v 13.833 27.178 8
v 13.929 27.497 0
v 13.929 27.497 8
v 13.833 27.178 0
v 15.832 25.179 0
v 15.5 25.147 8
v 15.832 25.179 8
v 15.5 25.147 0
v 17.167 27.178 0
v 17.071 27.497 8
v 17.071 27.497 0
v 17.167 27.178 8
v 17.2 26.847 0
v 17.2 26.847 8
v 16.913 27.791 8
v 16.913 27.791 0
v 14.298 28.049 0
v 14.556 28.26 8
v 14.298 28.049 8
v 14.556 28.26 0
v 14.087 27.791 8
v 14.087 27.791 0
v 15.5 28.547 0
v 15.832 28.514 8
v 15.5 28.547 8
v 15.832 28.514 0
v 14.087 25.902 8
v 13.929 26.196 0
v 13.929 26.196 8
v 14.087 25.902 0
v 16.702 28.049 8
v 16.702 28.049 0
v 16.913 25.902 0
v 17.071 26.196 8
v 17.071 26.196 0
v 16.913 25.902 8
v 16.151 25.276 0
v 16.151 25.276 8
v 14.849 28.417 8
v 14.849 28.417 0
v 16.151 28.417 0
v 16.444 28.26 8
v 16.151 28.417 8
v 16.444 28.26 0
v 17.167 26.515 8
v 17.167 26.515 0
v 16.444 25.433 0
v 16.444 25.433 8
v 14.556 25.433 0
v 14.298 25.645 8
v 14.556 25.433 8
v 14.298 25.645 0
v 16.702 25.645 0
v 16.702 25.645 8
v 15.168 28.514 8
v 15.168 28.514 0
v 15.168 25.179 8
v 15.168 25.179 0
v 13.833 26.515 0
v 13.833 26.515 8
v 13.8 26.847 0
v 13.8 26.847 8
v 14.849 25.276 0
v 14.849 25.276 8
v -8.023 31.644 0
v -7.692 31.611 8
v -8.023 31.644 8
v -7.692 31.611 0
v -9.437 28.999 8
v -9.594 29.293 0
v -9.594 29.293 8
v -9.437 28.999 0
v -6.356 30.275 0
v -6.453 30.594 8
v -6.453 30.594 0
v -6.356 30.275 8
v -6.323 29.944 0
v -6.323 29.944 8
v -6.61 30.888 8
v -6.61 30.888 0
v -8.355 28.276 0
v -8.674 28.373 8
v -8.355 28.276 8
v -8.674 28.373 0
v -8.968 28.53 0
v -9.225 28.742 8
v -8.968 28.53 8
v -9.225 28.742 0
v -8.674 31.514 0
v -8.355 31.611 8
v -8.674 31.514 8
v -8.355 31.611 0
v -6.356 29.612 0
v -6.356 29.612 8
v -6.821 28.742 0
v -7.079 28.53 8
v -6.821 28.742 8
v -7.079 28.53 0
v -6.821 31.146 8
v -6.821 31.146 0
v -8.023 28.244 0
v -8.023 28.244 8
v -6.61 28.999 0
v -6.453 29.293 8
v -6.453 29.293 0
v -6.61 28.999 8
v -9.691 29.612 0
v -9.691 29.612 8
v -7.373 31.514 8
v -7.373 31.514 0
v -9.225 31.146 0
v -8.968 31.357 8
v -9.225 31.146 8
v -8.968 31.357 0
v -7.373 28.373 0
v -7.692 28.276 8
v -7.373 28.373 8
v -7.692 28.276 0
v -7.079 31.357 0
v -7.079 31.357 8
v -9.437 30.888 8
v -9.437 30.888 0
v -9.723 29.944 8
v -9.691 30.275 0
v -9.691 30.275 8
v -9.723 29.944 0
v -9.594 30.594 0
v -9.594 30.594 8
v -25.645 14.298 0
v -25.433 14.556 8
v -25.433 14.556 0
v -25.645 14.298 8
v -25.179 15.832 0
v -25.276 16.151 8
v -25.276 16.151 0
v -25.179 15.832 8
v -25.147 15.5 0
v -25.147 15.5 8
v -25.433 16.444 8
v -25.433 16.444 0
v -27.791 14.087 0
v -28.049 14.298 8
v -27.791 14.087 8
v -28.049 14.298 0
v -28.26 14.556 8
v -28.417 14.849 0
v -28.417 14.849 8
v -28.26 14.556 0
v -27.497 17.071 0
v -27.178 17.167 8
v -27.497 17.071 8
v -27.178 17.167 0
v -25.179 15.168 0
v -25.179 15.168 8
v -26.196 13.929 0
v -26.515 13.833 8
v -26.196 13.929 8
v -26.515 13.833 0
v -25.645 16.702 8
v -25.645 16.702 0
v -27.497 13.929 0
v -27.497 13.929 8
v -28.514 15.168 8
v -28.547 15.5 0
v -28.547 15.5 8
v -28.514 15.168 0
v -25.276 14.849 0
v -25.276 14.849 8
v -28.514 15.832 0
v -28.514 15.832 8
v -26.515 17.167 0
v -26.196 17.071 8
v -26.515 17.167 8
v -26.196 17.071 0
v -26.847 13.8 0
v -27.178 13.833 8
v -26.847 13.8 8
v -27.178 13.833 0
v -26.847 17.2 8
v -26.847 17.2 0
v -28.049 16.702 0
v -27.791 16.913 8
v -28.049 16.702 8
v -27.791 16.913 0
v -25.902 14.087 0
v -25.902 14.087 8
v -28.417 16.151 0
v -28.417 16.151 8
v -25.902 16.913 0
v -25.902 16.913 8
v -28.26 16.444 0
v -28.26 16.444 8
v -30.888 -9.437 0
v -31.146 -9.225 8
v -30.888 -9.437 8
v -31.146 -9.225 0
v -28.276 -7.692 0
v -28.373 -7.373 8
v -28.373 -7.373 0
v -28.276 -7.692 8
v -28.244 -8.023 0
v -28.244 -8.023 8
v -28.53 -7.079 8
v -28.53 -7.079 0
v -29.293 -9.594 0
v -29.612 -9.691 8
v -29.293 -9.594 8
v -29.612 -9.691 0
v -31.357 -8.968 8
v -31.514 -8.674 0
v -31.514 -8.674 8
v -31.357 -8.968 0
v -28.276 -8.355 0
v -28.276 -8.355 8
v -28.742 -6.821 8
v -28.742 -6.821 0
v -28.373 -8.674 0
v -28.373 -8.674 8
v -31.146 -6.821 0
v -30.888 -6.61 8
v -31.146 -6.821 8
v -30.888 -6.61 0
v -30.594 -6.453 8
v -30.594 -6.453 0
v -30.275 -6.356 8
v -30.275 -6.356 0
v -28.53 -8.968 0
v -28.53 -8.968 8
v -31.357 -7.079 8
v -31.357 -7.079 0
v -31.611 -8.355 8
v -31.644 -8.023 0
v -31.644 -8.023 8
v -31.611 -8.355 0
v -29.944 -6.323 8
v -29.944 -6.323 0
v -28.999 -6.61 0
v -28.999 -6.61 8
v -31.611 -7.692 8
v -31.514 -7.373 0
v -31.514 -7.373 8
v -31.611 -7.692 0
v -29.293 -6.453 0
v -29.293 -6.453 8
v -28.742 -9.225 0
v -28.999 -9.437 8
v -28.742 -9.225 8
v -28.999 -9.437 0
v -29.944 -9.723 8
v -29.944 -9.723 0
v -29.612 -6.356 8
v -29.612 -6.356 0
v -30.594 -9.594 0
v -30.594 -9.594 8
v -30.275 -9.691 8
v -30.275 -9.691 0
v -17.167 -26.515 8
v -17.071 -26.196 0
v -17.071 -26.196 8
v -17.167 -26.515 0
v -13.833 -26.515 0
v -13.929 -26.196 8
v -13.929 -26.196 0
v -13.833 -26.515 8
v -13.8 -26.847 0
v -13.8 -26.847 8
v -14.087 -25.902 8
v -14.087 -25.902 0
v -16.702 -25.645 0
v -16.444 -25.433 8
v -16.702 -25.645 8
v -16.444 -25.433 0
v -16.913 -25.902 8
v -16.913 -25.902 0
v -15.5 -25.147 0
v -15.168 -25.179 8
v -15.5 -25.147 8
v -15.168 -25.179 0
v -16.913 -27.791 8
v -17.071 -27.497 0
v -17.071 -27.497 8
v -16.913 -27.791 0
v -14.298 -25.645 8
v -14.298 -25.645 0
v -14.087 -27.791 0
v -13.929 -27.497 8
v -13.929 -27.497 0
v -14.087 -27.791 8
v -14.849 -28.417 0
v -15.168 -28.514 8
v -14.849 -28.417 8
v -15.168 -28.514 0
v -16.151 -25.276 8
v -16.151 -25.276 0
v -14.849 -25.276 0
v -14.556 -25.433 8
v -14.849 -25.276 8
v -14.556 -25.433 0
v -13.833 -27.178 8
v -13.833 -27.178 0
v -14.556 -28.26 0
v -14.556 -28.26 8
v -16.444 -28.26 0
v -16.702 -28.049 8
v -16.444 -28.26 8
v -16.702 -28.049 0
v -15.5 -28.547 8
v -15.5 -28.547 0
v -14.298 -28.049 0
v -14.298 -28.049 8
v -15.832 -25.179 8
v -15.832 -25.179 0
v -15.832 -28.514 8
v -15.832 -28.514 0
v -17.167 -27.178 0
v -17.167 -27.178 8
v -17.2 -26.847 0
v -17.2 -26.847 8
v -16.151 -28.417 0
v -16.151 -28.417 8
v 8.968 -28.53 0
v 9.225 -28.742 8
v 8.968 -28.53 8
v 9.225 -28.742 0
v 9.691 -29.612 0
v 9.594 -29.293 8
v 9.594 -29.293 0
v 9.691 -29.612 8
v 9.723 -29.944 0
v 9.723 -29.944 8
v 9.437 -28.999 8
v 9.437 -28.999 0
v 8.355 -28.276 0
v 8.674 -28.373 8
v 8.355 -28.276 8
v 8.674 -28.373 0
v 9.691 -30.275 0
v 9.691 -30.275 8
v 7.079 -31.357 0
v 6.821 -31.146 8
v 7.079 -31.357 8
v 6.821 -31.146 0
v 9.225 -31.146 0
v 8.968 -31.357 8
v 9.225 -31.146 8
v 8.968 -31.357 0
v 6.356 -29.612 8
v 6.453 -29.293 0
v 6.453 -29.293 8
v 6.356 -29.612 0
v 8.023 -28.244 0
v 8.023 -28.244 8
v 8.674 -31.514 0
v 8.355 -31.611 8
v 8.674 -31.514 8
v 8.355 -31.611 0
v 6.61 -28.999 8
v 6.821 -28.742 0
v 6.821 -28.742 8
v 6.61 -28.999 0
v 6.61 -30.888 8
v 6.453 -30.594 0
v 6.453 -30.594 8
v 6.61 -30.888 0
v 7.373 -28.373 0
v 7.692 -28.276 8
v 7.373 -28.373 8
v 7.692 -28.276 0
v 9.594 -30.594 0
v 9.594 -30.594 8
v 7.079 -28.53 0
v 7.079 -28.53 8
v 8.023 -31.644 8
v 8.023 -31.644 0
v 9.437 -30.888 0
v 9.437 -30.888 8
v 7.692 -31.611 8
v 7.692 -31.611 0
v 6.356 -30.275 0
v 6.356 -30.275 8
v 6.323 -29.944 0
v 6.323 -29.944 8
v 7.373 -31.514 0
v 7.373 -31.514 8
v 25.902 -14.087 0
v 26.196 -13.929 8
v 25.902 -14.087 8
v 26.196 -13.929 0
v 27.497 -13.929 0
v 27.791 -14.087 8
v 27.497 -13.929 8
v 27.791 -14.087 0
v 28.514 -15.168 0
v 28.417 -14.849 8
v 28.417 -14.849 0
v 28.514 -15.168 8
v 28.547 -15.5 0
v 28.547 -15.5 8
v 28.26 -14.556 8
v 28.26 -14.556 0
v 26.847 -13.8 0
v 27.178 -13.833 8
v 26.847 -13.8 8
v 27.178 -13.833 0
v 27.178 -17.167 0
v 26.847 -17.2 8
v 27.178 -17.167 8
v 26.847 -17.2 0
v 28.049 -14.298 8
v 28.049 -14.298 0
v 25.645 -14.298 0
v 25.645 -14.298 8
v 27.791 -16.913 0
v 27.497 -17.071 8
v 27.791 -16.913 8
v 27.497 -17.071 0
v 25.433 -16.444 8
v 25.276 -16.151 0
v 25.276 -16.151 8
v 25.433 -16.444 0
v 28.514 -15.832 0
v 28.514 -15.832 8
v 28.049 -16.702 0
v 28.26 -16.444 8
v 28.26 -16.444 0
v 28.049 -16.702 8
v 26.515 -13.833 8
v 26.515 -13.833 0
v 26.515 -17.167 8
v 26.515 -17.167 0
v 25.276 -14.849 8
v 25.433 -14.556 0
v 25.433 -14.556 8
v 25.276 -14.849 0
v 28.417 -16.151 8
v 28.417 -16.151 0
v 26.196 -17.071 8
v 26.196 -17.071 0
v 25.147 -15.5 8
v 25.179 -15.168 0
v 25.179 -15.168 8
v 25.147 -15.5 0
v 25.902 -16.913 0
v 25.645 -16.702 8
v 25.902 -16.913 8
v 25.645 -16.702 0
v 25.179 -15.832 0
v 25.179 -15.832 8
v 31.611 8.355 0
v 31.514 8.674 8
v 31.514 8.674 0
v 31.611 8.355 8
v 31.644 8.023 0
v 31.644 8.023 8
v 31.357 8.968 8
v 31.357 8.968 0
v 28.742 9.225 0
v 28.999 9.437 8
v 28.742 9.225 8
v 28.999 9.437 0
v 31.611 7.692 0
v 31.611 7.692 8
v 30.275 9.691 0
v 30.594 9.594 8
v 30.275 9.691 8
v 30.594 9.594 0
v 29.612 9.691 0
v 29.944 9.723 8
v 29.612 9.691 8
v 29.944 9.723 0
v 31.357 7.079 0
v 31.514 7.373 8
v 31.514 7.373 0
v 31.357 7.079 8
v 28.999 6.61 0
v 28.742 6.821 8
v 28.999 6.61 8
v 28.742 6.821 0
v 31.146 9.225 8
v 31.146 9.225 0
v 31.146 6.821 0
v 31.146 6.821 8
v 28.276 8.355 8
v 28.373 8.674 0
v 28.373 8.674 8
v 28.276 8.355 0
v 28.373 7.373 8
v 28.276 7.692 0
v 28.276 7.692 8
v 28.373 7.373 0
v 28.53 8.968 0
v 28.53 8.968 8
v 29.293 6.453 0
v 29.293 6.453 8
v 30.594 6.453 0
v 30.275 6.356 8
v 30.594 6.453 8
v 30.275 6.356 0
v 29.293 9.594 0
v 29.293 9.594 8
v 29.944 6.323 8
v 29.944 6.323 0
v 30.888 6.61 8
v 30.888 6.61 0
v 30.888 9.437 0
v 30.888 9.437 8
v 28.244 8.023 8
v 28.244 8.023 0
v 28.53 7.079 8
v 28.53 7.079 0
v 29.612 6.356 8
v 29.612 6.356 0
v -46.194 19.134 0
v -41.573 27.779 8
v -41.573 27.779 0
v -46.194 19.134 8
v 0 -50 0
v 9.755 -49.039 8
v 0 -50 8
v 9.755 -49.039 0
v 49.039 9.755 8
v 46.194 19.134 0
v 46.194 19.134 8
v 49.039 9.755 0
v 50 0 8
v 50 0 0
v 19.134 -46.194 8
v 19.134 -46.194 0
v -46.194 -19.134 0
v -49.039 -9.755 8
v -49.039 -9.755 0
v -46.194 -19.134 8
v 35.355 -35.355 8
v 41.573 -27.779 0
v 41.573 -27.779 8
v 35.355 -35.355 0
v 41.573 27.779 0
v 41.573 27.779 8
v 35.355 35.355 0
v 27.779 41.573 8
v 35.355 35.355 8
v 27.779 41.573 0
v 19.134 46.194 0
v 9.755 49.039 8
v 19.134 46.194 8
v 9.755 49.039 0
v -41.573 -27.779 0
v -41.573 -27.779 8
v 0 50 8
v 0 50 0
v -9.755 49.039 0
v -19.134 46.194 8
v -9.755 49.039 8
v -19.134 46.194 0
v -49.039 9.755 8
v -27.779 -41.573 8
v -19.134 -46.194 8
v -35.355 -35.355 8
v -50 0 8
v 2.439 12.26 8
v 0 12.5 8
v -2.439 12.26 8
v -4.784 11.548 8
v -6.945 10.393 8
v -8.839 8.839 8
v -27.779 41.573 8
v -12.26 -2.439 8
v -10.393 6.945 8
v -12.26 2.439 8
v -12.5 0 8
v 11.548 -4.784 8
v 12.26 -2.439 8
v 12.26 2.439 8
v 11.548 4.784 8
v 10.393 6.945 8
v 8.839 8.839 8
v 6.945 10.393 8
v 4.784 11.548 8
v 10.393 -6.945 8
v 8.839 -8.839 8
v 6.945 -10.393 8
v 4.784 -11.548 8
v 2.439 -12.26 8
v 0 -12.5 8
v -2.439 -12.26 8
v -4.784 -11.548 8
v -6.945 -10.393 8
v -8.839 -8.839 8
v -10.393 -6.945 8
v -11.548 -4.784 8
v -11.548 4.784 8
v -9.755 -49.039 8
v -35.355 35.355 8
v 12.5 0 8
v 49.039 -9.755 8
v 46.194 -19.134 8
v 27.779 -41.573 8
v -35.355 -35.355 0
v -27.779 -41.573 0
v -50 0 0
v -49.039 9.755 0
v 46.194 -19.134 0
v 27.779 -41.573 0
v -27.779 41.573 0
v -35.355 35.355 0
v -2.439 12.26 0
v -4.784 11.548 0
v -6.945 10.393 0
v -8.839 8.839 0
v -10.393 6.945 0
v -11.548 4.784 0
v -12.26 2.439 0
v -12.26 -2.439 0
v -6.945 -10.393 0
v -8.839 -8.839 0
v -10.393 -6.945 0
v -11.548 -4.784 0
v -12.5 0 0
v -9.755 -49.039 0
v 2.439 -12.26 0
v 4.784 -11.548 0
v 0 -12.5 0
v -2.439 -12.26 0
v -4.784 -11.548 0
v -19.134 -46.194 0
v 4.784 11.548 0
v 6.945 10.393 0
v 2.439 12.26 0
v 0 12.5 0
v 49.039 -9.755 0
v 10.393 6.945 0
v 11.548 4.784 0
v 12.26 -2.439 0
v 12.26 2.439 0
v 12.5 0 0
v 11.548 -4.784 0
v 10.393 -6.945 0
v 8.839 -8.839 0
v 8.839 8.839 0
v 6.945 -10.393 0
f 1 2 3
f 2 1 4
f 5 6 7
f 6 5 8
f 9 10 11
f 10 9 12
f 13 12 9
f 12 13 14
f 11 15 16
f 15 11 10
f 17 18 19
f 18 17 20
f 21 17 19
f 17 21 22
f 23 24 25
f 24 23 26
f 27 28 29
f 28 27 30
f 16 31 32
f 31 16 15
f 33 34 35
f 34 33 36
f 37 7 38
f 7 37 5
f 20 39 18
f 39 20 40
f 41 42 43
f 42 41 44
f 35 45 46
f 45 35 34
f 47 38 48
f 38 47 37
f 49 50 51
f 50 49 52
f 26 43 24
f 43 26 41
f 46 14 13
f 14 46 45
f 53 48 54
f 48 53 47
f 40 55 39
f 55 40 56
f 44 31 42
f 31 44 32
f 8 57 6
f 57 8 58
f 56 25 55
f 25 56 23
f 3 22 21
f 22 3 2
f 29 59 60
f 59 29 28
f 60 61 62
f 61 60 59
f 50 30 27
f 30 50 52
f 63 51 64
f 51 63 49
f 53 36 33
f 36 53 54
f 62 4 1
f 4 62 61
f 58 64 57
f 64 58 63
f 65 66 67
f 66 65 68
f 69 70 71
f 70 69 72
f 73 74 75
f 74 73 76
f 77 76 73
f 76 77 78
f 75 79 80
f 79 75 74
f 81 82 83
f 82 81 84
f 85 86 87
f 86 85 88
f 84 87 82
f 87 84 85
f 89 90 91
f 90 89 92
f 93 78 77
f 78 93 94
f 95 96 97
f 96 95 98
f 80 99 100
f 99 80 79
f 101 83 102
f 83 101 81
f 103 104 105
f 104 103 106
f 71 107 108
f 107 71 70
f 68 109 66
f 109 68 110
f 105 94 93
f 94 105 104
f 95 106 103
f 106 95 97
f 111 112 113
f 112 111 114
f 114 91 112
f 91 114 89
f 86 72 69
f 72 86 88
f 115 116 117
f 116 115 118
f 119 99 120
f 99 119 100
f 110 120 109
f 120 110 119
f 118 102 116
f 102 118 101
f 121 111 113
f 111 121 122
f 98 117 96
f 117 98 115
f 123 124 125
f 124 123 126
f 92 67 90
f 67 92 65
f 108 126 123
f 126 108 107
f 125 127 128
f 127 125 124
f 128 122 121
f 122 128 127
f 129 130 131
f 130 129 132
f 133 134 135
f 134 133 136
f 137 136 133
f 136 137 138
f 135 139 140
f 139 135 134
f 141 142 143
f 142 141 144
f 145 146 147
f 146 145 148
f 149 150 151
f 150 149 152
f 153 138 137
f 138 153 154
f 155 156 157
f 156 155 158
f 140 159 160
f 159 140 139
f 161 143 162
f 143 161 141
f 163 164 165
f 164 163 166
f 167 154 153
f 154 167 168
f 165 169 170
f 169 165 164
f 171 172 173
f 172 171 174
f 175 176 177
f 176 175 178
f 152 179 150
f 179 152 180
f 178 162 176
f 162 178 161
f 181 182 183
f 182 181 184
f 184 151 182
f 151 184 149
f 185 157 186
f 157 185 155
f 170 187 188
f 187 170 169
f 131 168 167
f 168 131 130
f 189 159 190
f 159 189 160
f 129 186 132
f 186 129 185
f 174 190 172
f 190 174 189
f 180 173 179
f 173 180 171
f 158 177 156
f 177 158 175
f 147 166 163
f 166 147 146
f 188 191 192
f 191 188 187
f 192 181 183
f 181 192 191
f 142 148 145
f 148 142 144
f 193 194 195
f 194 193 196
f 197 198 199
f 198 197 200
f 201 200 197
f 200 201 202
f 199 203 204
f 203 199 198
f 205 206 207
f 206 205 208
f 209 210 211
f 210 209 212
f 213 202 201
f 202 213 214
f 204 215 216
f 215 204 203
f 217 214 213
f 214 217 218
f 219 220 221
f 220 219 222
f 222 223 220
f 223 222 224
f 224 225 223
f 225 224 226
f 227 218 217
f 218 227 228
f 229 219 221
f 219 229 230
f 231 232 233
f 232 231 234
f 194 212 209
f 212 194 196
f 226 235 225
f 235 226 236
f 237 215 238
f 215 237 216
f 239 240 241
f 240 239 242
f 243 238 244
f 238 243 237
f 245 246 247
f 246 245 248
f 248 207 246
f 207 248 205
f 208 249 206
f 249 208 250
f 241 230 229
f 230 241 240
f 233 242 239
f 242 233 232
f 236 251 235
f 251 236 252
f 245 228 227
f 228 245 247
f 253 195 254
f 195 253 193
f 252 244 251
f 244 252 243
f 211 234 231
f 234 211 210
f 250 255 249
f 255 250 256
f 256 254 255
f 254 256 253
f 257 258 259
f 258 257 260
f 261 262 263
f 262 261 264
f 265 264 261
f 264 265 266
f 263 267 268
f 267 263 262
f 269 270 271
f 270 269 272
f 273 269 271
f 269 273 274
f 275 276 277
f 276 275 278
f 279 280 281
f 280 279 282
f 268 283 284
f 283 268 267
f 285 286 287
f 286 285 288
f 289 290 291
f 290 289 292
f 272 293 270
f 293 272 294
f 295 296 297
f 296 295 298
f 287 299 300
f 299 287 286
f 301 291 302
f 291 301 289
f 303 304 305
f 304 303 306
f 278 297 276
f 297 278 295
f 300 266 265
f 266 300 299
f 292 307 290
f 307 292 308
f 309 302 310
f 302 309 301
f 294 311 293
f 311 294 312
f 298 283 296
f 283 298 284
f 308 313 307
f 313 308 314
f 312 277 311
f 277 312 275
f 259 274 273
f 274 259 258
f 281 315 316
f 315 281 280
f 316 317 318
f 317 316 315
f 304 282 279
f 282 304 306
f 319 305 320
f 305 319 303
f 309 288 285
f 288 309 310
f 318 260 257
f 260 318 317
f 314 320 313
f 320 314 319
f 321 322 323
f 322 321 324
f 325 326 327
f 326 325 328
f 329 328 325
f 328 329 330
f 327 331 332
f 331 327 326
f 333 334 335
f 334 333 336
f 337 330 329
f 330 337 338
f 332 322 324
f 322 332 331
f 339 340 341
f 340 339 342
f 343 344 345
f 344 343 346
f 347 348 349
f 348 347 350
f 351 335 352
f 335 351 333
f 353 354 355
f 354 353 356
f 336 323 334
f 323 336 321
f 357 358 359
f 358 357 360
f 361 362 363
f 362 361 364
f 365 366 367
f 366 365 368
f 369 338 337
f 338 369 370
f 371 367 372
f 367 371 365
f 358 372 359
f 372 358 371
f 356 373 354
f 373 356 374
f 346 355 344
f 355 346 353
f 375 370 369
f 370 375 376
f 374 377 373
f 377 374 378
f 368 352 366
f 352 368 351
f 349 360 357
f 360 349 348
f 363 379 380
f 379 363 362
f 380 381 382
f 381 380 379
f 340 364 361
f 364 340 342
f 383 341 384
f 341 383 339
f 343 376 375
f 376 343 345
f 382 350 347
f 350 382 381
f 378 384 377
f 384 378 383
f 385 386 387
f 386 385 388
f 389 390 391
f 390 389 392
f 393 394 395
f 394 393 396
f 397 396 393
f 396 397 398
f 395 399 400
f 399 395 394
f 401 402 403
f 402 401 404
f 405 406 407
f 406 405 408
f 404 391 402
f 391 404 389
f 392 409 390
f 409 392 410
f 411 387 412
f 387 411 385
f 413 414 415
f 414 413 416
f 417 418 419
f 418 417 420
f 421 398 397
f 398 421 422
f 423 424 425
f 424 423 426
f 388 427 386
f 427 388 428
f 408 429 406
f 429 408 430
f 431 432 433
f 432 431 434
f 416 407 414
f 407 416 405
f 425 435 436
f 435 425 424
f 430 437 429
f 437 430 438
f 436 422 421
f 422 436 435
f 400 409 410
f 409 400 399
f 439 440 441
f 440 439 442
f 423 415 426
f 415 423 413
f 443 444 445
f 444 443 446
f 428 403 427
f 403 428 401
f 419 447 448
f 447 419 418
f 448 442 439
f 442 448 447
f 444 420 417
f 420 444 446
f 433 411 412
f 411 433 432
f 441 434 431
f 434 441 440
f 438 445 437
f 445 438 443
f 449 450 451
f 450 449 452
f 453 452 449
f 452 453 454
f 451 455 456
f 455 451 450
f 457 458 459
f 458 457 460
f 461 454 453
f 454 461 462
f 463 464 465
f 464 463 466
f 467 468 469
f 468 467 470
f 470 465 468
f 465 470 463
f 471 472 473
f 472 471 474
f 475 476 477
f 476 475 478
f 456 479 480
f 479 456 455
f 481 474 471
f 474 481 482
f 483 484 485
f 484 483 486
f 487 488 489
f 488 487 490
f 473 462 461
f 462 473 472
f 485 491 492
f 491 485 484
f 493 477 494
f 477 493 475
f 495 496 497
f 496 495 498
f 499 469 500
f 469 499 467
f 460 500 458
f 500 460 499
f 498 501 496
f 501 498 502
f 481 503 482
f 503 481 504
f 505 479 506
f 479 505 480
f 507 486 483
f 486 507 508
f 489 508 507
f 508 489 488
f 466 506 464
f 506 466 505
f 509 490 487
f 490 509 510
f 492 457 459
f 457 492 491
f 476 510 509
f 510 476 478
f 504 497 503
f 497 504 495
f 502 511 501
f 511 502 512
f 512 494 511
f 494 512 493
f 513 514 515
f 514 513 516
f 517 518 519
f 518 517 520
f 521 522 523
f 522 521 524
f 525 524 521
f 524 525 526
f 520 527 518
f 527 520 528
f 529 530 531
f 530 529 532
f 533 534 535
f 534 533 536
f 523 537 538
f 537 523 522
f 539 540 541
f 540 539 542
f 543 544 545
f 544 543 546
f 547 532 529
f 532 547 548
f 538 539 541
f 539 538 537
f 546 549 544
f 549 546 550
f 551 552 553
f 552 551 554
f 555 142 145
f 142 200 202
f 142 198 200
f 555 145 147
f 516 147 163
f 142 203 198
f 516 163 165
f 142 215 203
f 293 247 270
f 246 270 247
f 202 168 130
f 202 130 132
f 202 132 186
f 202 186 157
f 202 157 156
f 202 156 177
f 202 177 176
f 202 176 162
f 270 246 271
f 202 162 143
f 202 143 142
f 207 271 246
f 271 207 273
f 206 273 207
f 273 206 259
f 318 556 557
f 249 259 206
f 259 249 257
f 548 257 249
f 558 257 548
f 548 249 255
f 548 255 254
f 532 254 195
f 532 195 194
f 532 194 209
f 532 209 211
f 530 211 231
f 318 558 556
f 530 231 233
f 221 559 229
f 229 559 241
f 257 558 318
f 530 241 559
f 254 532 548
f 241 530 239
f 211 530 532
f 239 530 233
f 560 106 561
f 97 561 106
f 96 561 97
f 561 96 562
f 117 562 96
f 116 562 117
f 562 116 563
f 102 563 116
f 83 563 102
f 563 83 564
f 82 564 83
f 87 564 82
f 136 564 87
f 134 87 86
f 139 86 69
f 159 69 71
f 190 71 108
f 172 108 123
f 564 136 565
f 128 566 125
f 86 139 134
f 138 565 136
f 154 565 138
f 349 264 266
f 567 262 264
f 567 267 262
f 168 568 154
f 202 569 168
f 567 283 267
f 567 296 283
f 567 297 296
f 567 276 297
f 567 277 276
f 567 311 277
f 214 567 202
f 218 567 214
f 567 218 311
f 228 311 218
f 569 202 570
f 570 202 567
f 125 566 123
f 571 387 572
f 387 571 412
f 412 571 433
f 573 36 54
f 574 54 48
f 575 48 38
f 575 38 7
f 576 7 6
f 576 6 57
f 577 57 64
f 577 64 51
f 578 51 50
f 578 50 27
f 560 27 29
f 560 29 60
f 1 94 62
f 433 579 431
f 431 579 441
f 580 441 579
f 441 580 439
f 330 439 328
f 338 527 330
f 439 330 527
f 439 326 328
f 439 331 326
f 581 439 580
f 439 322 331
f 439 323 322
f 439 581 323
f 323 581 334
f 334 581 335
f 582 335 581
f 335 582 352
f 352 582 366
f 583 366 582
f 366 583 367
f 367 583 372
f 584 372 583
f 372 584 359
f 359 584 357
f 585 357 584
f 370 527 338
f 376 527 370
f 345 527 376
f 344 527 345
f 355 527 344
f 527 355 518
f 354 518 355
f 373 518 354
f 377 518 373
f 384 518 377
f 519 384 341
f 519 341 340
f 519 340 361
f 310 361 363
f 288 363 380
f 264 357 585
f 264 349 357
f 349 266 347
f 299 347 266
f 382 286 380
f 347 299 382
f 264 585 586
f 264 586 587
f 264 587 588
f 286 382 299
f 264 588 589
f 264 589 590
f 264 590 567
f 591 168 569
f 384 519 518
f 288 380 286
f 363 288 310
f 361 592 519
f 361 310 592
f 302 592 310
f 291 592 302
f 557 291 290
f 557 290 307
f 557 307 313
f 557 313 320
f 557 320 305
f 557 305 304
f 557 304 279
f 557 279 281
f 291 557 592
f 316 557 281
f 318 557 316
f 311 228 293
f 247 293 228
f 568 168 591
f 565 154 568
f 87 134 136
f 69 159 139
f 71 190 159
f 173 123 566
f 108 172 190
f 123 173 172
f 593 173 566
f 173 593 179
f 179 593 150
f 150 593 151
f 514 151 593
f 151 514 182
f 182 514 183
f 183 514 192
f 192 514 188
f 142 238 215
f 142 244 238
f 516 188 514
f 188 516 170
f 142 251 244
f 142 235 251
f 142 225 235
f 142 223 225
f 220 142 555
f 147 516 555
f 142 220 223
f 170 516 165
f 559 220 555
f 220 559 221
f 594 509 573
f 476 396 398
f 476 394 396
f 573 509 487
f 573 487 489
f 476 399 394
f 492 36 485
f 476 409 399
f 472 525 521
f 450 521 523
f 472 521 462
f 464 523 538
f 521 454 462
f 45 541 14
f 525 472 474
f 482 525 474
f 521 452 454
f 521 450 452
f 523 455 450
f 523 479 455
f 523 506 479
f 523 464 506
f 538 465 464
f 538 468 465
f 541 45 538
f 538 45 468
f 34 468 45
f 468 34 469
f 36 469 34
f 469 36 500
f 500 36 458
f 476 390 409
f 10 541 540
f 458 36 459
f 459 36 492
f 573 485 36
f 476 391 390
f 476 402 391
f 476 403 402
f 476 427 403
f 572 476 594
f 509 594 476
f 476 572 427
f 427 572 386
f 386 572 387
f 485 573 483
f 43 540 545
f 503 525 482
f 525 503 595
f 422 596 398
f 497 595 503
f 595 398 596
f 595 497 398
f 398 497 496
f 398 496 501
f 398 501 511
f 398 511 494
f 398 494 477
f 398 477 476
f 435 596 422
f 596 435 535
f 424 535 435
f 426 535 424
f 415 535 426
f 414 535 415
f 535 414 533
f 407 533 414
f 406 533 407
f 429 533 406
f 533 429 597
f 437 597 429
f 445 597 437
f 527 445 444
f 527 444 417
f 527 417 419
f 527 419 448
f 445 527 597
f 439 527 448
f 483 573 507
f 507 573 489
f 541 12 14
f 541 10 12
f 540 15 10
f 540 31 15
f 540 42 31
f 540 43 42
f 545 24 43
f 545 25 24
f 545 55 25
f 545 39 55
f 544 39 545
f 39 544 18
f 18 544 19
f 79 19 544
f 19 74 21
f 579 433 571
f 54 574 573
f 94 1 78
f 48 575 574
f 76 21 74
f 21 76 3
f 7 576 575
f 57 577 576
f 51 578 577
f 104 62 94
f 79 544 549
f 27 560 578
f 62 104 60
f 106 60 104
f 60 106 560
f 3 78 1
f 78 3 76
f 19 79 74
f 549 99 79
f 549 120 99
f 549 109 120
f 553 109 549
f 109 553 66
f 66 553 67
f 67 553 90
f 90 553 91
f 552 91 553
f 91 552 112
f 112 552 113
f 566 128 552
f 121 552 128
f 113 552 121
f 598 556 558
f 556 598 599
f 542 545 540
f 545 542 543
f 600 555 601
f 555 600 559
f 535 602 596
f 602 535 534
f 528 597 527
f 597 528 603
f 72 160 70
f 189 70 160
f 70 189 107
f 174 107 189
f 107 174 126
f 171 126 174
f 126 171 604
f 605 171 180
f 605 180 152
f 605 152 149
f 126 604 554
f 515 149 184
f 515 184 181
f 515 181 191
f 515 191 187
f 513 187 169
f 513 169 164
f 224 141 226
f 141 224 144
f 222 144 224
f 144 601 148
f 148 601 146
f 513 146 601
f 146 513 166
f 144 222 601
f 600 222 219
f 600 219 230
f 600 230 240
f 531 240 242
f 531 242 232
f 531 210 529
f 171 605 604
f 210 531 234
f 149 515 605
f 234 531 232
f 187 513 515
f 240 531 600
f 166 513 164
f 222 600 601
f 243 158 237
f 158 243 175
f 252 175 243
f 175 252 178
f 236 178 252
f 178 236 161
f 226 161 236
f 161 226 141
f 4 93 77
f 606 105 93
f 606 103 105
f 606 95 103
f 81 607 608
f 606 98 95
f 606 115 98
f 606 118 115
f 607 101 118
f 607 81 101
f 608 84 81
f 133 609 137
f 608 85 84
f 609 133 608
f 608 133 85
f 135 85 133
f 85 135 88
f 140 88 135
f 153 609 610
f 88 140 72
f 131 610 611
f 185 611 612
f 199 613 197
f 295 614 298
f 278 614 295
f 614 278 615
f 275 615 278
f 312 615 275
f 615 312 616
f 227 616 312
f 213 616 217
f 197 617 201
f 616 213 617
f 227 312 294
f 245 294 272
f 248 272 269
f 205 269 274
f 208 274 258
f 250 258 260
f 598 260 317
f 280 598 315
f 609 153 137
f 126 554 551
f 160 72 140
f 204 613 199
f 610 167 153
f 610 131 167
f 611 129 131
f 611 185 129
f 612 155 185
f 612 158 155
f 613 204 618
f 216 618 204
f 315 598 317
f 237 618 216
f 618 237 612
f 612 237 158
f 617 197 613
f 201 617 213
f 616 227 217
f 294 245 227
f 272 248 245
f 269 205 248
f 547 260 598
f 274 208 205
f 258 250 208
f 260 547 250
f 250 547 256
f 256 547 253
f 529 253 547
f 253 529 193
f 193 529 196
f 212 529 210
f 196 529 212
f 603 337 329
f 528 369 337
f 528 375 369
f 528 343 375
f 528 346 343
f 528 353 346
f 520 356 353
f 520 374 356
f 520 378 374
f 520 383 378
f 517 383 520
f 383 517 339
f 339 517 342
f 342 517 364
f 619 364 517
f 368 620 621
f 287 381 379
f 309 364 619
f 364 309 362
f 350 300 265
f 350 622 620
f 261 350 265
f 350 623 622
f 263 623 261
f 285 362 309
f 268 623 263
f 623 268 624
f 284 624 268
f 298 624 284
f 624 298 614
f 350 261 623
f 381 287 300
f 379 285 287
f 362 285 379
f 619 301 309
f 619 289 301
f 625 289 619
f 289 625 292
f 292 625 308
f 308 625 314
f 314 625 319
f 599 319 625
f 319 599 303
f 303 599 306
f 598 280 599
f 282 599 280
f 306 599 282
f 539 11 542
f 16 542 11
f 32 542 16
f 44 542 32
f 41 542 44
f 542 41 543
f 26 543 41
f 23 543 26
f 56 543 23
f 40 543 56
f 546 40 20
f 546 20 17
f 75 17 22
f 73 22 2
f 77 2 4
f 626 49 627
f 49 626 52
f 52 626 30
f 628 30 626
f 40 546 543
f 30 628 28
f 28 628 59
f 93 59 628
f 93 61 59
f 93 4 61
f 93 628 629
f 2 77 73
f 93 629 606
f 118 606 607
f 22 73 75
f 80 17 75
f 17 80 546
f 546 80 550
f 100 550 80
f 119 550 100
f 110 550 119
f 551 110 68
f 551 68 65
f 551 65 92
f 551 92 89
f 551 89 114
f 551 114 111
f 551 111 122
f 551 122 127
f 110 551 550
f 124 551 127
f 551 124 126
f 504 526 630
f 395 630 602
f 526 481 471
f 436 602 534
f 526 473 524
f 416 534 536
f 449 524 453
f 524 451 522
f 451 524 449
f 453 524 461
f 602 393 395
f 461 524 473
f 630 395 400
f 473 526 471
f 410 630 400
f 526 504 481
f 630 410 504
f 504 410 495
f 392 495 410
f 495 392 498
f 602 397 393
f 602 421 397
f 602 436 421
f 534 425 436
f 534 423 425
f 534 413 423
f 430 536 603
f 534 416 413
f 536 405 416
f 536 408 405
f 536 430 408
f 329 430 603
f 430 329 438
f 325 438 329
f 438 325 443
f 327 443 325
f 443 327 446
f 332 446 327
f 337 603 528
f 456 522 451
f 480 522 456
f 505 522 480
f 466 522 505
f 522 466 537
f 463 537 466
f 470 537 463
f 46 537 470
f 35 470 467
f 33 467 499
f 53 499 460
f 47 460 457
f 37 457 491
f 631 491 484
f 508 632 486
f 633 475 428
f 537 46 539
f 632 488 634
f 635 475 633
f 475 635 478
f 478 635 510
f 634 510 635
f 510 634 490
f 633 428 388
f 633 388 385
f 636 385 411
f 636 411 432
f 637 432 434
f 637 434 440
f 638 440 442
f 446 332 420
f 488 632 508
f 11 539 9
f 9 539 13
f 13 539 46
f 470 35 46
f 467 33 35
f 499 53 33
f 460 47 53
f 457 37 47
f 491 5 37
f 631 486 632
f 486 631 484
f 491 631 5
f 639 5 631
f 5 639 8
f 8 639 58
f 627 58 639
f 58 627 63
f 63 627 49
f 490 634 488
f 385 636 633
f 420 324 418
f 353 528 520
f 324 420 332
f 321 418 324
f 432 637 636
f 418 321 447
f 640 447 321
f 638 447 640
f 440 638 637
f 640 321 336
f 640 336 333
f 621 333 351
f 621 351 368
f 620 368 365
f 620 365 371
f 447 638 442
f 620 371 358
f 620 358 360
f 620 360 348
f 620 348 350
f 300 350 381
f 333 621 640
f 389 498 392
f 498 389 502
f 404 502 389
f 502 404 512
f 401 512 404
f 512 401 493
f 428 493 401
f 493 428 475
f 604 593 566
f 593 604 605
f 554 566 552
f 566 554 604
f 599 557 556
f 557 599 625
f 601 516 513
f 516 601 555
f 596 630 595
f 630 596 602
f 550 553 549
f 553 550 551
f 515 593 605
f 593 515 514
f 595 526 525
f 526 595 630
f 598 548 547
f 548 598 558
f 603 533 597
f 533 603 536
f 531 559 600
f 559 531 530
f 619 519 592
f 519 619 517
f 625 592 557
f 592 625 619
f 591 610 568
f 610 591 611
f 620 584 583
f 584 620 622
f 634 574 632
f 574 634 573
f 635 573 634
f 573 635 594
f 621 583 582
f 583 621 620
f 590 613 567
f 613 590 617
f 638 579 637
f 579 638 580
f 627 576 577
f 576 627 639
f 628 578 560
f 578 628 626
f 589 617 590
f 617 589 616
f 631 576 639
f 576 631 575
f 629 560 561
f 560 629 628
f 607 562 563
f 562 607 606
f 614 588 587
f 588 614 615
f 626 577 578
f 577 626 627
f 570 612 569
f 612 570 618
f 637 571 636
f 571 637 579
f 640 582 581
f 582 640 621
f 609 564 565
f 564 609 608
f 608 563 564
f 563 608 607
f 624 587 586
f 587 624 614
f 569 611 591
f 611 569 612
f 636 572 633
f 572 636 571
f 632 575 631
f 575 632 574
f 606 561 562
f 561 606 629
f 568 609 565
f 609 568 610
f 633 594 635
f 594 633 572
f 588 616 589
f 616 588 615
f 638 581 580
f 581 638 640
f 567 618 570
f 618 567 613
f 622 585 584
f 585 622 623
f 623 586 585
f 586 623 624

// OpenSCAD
$fn = 32;

// ----------------------------------------------------------------------
// Flange Ø100 x 8
// 8 holes on a Ø62 bolt circle, bolted joints
// ----------------------------------------------------------------------

// --- parameters (mm) ---
flange_d = 100;  // outside diameter of the flange
thickness = 8;   // flange thickness
holes = 8;       // number of bolt holes
pcd = 62;        // bolt circle diameter
start_deg = 60;  // angle of the first hole, from +X
hole_d = 3.4;    // bolt hole diameter
bore_d = 25;     // central through bore
hub_d = 37;      // hub outside diameter
hub_h = 0;       // hub height above the flange face (0 = no hub)

// --- derived feature positions (mm) ---
height = thickness + hub_h;  // = 8   overall height of the part
pcd_r = pcd / 2;             // = 31   bolt circle radius
hole_step = 360 / holes;     // = 45   angular pitch
feature_centers = [
  [pcd_r * cos(start_deg + 0 * hole_step), pcd_r * sin(start_deg + 0 * hole_step)],
  [pcd_r * cos(start_deg + 1 * hole_step), pcd_r * sin(start_deg + 1 * hole_step)],
  [pcd_r * cos(start_deg + 2 * hole_step), pcd_r * sin(start_deg + 2 * hole_step)],
  [pcd_r * cos(start_deg + 3 * hole_step), pcd_r * sin(start_deg + 3 * hole_step)],
  [pcd_r * cos(start_deg + 4 * hole_step), pcd_r * sin(start_deg + 4 * hole_step)],
  [pcd_r * cos(start_deg + 5 * hole_step), pcd_r * sin(start_deg + 5 * hole_step)],
  [pcd_r * cos(start_deg + 6 * hole_step), pcd_r * sin(start_deg + 6 * hole_step)],
  [pcd_r * cos(start_deg + 7 * hole_step), pcd_r * sin(start_deg + 7 * hole_step)]
];   // bolt hole centres on the pitch circle

// flange disc, every hole and the bore cut straight through
difference() {
  union() {
    cylinder(d = flange_d, h = thickness);
  }
  translate([0, 0, -1]) cylinder(d = bore_d, h = height + 2);  // bore, through
  for (centre = feature_centers)
    translate([centre[0], centre[1], -1]) cylinder(d = hole_d, h = thickness + 2);
}
